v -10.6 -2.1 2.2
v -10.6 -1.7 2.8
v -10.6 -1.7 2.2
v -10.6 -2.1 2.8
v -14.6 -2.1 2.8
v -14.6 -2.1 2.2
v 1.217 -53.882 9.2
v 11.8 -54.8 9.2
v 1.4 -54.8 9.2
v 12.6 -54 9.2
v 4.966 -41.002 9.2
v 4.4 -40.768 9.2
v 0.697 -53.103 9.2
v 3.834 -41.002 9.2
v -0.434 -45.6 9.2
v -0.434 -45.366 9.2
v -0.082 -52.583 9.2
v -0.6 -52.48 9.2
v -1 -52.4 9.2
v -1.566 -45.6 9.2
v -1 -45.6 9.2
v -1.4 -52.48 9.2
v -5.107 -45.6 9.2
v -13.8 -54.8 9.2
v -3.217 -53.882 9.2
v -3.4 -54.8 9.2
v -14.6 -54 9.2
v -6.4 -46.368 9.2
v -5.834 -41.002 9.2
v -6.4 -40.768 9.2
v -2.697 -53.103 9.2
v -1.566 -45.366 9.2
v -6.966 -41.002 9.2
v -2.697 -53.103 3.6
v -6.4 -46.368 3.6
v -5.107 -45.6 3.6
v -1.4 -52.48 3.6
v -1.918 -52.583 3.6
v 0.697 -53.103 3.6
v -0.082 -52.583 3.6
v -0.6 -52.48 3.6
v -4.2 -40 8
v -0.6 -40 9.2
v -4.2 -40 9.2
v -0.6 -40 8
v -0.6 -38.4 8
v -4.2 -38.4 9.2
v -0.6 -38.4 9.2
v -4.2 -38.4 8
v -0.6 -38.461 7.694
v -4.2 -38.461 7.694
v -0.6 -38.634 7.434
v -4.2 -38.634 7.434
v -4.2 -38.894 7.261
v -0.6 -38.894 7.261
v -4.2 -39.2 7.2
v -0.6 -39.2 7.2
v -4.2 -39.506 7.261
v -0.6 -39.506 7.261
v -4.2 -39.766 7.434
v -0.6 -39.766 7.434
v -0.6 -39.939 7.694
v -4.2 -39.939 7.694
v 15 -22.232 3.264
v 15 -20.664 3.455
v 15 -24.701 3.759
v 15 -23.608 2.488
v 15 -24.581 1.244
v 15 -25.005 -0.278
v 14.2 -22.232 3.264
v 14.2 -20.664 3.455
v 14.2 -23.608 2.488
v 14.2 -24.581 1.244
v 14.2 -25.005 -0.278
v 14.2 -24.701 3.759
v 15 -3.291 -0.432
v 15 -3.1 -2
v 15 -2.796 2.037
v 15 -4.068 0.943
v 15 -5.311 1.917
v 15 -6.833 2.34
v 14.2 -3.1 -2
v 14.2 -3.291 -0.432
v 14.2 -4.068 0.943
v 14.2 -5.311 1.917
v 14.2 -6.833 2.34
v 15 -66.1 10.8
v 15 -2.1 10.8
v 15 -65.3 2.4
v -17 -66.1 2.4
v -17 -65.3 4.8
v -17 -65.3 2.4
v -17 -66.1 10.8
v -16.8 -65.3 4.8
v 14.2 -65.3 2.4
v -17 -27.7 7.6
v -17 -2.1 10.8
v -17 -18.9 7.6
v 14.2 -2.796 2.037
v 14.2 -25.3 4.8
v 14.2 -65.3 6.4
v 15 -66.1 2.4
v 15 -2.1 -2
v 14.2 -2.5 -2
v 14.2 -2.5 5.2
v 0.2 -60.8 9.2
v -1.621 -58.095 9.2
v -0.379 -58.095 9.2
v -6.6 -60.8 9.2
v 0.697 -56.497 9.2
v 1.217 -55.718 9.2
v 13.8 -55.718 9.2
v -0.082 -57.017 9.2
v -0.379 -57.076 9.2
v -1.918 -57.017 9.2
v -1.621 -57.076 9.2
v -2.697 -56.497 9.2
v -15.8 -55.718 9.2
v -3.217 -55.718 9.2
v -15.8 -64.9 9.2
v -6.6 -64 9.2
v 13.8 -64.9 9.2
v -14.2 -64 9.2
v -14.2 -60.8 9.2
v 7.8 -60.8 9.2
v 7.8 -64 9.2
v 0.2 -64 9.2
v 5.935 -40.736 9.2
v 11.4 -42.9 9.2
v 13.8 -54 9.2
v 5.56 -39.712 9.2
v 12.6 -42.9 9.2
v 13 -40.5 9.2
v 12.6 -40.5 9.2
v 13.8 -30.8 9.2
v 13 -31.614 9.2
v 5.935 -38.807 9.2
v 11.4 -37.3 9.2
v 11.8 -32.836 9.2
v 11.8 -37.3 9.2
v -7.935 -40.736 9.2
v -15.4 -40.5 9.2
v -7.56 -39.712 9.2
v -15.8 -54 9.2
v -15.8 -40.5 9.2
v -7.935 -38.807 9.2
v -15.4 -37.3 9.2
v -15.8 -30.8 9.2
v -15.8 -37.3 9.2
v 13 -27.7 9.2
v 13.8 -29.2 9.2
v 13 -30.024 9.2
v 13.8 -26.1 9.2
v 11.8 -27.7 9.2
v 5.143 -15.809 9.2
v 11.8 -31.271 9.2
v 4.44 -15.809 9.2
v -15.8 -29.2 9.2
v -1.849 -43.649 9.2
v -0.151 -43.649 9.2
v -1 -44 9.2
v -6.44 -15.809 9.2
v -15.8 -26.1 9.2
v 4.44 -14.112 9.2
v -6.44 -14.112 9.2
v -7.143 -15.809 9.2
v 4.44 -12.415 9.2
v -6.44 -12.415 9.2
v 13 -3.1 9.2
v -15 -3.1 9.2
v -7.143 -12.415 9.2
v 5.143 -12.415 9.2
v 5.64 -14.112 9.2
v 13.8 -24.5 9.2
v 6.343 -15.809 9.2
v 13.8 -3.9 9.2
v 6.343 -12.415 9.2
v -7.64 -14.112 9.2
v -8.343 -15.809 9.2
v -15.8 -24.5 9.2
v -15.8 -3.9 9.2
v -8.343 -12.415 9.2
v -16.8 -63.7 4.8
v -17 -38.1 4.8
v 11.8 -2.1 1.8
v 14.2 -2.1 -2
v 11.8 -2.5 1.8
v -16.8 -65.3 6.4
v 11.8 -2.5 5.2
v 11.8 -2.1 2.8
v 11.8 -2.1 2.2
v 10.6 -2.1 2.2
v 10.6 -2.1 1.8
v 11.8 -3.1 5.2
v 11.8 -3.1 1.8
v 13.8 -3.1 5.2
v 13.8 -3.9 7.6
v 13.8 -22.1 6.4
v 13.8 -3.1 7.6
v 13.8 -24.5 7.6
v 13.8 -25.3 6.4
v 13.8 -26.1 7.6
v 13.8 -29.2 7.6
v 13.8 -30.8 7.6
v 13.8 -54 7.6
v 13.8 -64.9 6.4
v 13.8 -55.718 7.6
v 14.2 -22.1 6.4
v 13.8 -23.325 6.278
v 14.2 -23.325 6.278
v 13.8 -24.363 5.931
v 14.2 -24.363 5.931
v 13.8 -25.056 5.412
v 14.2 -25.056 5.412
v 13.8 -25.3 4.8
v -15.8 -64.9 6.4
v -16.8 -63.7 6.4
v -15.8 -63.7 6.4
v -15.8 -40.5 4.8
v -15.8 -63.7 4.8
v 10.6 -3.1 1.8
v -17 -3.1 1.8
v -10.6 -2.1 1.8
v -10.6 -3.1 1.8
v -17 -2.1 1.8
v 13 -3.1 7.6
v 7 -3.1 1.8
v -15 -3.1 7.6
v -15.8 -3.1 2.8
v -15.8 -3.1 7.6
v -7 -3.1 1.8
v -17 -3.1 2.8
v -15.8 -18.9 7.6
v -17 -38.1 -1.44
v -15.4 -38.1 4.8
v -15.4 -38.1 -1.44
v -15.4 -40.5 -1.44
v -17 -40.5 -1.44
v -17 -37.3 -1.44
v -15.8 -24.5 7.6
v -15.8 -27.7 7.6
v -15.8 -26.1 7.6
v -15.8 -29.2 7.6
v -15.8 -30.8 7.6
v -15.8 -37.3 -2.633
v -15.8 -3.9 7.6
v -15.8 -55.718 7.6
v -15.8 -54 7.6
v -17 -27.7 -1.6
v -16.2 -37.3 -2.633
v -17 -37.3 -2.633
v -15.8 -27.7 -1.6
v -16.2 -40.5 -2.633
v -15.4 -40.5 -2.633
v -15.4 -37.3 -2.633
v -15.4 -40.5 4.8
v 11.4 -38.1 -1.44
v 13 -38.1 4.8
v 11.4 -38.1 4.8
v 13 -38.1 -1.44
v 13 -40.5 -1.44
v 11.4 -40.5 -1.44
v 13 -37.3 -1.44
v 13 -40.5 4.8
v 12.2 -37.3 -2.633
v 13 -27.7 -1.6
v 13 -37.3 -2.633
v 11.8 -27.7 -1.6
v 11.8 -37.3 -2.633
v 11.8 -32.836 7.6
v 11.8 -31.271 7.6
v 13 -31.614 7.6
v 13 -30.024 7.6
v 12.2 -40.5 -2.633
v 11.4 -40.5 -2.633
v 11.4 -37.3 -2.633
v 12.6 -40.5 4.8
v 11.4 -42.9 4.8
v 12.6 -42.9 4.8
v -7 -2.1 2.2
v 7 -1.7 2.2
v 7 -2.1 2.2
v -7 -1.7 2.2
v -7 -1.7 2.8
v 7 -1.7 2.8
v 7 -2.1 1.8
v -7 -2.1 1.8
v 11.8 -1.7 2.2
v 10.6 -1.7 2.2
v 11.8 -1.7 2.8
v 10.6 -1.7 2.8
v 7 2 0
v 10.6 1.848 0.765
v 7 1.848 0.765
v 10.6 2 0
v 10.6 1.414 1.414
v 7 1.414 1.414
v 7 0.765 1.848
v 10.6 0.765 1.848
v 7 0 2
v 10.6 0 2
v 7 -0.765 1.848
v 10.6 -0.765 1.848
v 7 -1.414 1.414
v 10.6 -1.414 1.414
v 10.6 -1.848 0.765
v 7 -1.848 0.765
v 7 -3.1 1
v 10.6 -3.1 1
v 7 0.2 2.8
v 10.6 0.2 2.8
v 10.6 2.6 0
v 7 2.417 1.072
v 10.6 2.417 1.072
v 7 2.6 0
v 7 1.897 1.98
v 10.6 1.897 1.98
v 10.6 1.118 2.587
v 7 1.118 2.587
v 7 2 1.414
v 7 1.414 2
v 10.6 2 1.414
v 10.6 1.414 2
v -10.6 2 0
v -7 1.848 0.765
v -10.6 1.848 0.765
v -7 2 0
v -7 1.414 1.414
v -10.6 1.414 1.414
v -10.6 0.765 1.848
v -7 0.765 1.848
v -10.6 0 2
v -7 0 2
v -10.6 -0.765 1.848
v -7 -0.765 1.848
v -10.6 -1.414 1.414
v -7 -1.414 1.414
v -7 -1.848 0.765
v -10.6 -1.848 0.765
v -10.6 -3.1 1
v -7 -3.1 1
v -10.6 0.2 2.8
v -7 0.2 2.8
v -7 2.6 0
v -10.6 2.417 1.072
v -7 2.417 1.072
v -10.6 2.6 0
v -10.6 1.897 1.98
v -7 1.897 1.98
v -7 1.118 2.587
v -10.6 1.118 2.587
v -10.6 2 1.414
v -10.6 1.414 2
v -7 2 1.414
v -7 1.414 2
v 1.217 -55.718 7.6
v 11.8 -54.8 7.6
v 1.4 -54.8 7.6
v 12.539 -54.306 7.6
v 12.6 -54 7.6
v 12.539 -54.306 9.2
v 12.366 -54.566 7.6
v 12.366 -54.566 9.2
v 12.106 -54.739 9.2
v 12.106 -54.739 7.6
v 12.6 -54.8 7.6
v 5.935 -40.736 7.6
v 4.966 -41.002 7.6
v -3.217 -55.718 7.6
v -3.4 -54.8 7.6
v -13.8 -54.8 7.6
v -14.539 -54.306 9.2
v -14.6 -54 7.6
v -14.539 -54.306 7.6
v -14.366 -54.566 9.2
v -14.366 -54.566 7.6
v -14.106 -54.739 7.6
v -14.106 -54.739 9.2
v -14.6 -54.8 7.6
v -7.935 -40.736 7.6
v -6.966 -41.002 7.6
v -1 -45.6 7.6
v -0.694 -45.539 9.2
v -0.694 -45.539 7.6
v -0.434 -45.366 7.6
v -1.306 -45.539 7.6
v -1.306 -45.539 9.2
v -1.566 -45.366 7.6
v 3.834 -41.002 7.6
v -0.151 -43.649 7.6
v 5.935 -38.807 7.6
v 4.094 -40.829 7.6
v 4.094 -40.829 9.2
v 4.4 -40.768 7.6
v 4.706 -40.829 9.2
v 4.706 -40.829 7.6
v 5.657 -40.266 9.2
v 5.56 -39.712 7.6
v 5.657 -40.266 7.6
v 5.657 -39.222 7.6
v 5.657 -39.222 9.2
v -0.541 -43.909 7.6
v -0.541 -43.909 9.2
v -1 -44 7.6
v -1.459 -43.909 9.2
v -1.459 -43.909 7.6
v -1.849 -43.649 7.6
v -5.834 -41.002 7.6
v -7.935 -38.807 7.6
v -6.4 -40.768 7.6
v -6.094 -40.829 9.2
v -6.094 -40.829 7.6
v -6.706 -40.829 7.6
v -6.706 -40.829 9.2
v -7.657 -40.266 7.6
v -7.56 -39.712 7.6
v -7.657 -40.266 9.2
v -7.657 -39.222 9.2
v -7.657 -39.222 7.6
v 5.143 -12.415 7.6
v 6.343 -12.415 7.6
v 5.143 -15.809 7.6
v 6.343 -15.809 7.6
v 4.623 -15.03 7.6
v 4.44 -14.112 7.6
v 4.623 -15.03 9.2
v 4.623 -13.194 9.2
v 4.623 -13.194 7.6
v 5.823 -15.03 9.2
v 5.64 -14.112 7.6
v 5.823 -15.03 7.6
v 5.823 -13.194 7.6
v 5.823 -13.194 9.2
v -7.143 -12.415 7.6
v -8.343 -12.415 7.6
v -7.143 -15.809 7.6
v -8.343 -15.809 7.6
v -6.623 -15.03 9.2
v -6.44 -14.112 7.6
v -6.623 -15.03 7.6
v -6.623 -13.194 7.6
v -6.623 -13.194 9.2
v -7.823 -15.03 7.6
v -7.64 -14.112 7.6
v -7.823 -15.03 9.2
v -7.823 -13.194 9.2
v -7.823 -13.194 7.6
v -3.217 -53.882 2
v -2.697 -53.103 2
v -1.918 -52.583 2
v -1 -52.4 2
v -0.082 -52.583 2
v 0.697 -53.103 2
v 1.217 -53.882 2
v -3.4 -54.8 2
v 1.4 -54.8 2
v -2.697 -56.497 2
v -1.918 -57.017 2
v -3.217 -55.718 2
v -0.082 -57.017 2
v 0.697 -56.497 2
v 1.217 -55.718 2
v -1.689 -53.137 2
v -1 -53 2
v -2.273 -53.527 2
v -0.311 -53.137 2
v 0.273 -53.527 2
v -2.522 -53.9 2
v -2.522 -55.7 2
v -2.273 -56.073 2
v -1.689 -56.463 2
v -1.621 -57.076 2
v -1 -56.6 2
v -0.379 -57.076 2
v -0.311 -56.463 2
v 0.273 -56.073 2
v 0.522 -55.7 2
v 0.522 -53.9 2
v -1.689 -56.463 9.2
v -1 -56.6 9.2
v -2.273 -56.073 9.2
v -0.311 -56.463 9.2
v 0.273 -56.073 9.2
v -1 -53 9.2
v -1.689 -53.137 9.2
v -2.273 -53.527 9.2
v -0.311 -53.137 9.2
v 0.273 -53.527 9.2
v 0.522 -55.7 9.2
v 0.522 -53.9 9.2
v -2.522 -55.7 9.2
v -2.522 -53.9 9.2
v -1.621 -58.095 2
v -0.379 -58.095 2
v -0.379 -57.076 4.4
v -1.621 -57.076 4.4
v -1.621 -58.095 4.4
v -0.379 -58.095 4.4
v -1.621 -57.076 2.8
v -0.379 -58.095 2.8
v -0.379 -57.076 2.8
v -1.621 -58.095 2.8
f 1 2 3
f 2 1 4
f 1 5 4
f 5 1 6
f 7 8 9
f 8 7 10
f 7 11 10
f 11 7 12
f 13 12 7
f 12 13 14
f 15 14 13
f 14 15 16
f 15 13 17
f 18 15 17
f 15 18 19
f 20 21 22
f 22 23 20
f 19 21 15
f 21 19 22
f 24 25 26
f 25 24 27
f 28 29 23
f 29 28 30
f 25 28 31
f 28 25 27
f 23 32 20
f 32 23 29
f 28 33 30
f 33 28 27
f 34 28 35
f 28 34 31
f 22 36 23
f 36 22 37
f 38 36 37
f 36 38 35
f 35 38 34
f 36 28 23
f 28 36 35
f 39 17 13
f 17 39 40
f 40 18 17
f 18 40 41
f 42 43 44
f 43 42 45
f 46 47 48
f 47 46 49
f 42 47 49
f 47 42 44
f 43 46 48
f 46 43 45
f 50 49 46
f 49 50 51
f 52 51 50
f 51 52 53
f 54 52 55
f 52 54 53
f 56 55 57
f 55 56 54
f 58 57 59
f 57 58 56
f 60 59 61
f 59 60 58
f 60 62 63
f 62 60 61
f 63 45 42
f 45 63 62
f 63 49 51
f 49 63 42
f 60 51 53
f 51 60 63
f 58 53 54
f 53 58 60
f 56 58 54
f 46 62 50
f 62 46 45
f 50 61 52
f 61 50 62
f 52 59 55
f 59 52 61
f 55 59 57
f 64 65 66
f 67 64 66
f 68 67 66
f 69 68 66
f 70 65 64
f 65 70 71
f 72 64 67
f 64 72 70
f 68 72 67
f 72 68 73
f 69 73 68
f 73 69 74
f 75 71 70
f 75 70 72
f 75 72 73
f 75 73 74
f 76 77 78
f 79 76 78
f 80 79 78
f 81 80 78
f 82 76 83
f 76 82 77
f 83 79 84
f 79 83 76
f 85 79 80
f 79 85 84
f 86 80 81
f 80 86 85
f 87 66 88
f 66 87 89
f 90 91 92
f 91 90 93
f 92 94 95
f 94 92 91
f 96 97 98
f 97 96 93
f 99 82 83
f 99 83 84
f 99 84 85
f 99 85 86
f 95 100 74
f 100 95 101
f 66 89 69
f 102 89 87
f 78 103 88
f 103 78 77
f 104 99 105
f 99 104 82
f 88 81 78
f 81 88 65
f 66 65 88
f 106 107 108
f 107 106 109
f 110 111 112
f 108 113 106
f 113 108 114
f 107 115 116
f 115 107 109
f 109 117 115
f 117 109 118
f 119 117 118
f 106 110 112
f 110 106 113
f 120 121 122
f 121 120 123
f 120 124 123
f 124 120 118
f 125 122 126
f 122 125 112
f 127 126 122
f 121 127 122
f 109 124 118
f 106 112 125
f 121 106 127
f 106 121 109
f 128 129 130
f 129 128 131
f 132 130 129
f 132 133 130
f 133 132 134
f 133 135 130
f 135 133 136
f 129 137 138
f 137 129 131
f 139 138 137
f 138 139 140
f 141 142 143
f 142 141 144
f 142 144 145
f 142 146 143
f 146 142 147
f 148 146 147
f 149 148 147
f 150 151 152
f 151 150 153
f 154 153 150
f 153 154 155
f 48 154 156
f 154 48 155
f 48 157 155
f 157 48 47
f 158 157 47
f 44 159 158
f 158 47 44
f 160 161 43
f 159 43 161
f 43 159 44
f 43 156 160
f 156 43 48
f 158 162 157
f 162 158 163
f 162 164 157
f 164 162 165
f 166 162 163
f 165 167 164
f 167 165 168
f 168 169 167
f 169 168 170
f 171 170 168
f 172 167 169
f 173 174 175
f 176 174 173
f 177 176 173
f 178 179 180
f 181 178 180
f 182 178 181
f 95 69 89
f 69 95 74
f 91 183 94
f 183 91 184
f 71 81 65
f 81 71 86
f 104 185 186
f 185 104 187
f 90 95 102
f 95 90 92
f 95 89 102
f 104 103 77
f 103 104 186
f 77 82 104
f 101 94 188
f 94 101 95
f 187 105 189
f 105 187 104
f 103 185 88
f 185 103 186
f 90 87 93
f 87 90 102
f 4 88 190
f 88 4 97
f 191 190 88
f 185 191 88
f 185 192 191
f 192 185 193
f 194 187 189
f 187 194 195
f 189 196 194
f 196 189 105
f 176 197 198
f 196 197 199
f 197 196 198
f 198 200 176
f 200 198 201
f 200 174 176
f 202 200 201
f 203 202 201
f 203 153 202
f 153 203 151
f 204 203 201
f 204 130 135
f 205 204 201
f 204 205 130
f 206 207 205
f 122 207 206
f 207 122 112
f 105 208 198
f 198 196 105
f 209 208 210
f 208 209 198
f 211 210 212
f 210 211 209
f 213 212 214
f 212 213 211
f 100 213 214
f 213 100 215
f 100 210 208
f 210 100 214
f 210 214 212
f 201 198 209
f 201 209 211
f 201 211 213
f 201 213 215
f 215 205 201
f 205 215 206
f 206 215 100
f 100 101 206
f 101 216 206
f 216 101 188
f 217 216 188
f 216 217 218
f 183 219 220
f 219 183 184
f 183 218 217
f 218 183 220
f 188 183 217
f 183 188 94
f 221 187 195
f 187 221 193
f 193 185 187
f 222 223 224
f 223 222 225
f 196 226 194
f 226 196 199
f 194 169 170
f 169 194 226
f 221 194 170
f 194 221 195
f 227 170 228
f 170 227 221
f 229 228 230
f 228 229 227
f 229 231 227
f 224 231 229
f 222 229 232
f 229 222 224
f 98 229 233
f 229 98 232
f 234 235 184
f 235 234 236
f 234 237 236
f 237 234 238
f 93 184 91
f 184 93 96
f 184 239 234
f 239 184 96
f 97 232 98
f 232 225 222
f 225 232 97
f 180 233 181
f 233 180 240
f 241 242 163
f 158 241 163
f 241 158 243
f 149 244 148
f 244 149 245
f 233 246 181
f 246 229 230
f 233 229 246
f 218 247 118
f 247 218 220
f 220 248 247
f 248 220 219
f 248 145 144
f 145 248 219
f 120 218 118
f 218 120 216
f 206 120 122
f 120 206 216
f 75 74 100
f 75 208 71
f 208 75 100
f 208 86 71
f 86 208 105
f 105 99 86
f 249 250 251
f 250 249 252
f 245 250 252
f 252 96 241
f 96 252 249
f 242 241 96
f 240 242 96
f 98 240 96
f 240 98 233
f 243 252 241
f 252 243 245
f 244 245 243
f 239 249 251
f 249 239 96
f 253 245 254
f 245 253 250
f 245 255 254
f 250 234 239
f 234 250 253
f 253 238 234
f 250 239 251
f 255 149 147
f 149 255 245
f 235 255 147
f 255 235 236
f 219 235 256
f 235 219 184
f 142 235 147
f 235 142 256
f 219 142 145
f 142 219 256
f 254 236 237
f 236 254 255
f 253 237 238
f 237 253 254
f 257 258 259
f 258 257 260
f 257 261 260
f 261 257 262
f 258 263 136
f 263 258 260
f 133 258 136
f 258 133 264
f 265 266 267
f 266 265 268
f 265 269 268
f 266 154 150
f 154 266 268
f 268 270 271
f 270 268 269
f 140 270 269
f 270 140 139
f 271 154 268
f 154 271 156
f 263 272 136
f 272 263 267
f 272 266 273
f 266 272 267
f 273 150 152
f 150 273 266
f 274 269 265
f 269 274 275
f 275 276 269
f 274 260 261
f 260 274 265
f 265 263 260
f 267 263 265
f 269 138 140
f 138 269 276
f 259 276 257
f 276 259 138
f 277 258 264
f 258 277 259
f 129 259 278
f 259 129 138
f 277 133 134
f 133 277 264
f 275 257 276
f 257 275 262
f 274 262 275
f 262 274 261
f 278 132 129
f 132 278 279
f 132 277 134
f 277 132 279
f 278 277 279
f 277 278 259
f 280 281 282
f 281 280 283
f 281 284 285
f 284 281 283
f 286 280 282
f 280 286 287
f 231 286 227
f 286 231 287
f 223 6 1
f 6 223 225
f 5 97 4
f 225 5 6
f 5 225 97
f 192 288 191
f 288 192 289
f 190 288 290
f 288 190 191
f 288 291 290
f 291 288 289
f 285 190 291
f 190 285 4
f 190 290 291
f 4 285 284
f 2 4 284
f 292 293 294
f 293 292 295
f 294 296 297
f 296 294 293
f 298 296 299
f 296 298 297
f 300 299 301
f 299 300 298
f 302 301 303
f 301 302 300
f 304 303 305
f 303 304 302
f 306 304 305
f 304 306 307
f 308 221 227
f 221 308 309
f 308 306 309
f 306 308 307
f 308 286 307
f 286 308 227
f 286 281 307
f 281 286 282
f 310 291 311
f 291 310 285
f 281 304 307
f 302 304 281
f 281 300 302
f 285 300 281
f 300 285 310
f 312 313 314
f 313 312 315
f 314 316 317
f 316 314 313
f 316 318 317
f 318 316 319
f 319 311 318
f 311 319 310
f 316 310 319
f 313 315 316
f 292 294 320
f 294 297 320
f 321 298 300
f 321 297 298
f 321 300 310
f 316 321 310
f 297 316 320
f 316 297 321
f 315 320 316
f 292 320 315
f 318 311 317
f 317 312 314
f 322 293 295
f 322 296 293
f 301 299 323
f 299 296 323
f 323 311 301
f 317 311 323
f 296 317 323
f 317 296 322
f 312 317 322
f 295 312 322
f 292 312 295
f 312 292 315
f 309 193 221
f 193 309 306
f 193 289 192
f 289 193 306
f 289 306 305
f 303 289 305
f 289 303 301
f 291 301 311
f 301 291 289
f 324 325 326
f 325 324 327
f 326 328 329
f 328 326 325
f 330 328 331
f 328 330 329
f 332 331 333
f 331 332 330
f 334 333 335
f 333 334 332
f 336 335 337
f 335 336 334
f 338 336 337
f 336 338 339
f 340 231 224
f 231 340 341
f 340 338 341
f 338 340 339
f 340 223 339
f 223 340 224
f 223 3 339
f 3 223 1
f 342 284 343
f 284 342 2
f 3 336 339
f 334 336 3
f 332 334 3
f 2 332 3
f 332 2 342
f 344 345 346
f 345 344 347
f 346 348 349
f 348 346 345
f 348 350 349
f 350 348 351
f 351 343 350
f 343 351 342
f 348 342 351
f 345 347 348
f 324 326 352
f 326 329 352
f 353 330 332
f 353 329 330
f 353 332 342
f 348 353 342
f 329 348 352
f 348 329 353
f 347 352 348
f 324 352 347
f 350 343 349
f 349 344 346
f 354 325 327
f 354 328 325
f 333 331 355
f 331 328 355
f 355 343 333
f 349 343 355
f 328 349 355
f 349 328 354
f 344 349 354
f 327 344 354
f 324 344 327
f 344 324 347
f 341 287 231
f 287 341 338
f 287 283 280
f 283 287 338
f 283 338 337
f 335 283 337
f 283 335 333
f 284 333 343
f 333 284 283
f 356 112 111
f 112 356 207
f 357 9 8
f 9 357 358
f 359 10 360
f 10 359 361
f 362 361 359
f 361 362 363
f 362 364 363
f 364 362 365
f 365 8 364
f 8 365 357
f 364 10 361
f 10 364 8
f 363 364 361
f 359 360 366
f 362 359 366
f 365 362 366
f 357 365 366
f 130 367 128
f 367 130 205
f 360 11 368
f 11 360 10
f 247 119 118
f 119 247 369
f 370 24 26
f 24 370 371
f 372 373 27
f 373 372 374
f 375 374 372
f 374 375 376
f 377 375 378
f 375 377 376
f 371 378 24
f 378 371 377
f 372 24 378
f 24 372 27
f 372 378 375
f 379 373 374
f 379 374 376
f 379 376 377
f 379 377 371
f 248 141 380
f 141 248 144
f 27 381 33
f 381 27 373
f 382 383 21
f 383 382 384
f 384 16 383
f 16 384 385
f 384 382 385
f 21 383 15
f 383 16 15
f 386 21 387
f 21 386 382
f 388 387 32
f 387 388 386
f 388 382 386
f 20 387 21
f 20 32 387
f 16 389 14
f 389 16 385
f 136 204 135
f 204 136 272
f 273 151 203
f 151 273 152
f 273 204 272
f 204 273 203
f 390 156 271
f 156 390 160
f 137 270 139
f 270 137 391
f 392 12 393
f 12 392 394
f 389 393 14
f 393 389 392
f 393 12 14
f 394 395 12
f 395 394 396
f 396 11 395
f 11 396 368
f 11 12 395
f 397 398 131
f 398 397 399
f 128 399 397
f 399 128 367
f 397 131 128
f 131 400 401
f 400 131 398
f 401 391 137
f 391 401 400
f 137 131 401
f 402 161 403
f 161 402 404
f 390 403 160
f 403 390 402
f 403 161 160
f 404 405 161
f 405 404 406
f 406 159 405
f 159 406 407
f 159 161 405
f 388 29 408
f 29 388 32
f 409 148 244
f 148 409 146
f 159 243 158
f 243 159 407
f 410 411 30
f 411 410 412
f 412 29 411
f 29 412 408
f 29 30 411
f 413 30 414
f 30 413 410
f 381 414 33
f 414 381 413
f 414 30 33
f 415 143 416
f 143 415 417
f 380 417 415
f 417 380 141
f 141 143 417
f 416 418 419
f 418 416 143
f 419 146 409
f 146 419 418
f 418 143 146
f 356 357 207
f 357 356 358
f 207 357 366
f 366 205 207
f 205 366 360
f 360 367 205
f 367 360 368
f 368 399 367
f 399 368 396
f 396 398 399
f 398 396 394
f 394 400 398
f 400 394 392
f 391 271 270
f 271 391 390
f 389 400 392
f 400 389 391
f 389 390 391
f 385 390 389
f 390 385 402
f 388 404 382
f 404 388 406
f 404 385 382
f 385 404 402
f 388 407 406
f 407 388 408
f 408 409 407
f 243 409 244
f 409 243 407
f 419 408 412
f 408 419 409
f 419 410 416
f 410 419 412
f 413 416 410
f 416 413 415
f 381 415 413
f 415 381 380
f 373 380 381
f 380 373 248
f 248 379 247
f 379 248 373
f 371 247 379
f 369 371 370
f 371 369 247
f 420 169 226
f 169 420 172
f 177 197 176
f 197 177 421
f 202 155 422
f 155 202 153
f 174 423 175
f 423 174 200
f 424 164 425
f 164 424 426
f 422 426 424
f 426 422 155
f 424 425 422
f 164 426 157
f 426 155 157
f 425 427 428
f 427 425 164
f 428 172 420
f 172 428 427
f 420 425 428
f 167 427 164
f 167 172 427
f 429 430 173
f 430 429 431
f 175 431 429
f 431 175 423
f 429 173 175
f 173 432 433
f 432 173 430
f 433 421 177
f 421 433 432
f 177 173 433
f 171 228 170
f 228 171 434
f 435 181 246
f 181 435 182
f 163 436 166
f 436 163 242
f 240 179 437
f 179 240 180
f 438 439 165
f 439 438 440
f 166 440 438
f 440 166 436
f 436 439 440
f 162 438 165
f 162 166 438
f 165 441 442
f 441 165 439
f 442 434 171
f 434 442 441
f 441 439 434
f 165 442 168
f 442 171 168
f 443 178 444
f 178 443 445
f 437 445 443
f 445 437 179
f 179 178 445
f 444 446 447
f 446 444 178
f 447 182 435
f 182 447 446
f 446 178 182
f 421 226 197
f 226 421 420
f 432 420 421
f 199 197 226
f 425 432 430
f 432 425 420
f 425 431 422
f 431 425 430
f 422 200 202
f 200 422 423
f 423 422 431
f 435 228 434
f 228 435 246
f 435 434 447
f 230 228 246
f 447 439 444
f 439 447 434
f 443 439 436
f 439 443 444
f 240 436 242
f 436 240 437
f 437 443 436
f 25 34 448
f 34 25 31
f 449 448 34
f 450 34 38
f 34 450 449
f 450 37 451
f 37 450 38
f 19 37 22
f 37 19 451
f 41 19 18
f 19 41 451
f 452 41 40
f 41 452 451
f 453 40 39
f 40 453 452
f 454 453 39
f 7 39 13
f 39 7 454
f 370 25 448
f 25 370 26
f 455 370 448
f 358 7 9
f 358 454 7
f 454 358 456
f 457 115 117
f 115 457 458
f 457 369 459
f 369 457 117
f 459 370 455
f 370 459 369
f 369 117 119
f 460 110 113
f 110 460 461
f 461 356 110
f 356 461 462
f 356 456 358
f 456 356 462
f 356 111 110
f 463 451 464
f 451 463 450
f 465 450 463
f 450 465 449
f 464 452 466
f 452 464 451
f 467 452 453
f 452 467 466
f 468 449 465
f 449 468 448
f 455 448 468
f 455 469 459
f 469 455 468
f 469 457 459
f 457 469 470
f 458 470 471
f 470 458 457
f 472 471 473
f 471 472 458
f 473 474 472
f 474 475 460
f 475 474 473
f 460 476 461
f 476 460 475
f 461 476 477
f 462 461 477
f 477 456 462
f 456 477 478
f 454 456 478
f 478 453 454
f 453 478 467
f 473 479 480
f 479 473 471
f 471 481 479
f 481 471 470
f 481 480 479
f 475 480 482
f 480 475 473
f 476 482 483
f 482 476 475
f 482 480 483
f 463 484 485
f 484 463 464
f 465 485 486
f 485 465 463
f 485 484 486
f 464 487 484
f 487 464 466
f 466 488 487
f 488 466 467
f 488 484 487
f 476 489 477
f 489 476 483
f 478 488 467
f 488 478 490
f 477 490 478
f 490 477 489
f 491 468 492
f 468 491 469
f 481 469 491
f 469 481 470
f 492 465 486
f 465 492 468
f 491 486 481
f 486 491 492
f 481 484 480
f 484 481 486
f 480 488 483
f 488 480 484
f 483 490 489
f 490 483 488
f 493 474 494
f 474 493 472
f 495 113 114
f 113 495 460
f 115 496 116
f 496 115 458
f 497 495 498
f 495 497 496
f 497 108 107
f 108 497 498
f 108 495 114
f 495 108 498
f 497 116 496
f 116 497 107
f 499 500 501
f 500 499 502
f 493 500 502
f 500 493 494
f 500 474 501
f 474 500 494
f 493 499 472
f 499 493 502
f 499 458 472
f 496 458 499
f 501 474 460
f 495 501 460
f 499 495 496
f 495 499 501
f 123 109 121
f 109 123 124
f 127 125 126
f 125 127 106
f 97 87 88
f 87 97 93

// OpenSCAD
use <../lib.scad>
use <s/4111s01.scad>
use <s/4112s01.scad>
function ldraw_lib__4111() = [
// 0 ~Electric Switch: Key Right
// 0 Name: 4111.dat
// 0 Author: Javier Orquera [kuramapika1]
// 0 !LDRAW_ORG Part UPDATE 2025-09
// 0 !LICENSE Licensed under CC BY 4.0 : see CAreadme.txt
// 
// 0 !HELP to put this part into a pressed-down state, rotate it 4.3 degrees
// 0 !HELP around the x-axis
// 
// 0 BFC CERTIFY CCW
  [0,"BFC","CERTIFY"],
  [0,"BFC","CCW"],
// 
// 0 !KEYWORDS control, dacta, Technic, Train
// 
// 0 !HISTORY 2025-04-24 [kuramapika1] Adapted surfaces
// 0 !HISTORY 2025-09-11 [kuramapika1] Use of new subfile
// 0 !HISTORY 2025-09-29 [OrionP] Official Update 2025-09
// 
// 1 16 0 0 0 1 0 0 0 1 0 0 0 1 s\4111s01.dat
  [1,16,0,0,0,1,0,0,0,1,0,0,0,1, ldraw_lib__s__4111s01()],
// 1 16 0 0 0 -1 0 0 0 1 0 0 0 1 s\4112s01.dat
  [1,16,0,0,0,-1,0,0,0,1,0,0,0,1, ldraw_lib__s__4112s01()],
// 4 16 -42.5 -27 -5.25 -42.5 -27 -165.25 37.5 -27 -165.25 37.5 -27 -5.25
  [4,16,-42.5,-27,-5.25,-42.5,-27,-165.25,37.5,-27,-165.25,37.5,-27,-5.25],
];
module ldraw_lib__4111(step=0, col=false, unit=2/5, alt=false, line=0.2, solid=!$preview)
    makepoly(ldraw_lib__4111(), step=step, col=col, unit=unit, alt=alt, line=line, solid=solid);
ldraw_lib__4111(line=0.2);
